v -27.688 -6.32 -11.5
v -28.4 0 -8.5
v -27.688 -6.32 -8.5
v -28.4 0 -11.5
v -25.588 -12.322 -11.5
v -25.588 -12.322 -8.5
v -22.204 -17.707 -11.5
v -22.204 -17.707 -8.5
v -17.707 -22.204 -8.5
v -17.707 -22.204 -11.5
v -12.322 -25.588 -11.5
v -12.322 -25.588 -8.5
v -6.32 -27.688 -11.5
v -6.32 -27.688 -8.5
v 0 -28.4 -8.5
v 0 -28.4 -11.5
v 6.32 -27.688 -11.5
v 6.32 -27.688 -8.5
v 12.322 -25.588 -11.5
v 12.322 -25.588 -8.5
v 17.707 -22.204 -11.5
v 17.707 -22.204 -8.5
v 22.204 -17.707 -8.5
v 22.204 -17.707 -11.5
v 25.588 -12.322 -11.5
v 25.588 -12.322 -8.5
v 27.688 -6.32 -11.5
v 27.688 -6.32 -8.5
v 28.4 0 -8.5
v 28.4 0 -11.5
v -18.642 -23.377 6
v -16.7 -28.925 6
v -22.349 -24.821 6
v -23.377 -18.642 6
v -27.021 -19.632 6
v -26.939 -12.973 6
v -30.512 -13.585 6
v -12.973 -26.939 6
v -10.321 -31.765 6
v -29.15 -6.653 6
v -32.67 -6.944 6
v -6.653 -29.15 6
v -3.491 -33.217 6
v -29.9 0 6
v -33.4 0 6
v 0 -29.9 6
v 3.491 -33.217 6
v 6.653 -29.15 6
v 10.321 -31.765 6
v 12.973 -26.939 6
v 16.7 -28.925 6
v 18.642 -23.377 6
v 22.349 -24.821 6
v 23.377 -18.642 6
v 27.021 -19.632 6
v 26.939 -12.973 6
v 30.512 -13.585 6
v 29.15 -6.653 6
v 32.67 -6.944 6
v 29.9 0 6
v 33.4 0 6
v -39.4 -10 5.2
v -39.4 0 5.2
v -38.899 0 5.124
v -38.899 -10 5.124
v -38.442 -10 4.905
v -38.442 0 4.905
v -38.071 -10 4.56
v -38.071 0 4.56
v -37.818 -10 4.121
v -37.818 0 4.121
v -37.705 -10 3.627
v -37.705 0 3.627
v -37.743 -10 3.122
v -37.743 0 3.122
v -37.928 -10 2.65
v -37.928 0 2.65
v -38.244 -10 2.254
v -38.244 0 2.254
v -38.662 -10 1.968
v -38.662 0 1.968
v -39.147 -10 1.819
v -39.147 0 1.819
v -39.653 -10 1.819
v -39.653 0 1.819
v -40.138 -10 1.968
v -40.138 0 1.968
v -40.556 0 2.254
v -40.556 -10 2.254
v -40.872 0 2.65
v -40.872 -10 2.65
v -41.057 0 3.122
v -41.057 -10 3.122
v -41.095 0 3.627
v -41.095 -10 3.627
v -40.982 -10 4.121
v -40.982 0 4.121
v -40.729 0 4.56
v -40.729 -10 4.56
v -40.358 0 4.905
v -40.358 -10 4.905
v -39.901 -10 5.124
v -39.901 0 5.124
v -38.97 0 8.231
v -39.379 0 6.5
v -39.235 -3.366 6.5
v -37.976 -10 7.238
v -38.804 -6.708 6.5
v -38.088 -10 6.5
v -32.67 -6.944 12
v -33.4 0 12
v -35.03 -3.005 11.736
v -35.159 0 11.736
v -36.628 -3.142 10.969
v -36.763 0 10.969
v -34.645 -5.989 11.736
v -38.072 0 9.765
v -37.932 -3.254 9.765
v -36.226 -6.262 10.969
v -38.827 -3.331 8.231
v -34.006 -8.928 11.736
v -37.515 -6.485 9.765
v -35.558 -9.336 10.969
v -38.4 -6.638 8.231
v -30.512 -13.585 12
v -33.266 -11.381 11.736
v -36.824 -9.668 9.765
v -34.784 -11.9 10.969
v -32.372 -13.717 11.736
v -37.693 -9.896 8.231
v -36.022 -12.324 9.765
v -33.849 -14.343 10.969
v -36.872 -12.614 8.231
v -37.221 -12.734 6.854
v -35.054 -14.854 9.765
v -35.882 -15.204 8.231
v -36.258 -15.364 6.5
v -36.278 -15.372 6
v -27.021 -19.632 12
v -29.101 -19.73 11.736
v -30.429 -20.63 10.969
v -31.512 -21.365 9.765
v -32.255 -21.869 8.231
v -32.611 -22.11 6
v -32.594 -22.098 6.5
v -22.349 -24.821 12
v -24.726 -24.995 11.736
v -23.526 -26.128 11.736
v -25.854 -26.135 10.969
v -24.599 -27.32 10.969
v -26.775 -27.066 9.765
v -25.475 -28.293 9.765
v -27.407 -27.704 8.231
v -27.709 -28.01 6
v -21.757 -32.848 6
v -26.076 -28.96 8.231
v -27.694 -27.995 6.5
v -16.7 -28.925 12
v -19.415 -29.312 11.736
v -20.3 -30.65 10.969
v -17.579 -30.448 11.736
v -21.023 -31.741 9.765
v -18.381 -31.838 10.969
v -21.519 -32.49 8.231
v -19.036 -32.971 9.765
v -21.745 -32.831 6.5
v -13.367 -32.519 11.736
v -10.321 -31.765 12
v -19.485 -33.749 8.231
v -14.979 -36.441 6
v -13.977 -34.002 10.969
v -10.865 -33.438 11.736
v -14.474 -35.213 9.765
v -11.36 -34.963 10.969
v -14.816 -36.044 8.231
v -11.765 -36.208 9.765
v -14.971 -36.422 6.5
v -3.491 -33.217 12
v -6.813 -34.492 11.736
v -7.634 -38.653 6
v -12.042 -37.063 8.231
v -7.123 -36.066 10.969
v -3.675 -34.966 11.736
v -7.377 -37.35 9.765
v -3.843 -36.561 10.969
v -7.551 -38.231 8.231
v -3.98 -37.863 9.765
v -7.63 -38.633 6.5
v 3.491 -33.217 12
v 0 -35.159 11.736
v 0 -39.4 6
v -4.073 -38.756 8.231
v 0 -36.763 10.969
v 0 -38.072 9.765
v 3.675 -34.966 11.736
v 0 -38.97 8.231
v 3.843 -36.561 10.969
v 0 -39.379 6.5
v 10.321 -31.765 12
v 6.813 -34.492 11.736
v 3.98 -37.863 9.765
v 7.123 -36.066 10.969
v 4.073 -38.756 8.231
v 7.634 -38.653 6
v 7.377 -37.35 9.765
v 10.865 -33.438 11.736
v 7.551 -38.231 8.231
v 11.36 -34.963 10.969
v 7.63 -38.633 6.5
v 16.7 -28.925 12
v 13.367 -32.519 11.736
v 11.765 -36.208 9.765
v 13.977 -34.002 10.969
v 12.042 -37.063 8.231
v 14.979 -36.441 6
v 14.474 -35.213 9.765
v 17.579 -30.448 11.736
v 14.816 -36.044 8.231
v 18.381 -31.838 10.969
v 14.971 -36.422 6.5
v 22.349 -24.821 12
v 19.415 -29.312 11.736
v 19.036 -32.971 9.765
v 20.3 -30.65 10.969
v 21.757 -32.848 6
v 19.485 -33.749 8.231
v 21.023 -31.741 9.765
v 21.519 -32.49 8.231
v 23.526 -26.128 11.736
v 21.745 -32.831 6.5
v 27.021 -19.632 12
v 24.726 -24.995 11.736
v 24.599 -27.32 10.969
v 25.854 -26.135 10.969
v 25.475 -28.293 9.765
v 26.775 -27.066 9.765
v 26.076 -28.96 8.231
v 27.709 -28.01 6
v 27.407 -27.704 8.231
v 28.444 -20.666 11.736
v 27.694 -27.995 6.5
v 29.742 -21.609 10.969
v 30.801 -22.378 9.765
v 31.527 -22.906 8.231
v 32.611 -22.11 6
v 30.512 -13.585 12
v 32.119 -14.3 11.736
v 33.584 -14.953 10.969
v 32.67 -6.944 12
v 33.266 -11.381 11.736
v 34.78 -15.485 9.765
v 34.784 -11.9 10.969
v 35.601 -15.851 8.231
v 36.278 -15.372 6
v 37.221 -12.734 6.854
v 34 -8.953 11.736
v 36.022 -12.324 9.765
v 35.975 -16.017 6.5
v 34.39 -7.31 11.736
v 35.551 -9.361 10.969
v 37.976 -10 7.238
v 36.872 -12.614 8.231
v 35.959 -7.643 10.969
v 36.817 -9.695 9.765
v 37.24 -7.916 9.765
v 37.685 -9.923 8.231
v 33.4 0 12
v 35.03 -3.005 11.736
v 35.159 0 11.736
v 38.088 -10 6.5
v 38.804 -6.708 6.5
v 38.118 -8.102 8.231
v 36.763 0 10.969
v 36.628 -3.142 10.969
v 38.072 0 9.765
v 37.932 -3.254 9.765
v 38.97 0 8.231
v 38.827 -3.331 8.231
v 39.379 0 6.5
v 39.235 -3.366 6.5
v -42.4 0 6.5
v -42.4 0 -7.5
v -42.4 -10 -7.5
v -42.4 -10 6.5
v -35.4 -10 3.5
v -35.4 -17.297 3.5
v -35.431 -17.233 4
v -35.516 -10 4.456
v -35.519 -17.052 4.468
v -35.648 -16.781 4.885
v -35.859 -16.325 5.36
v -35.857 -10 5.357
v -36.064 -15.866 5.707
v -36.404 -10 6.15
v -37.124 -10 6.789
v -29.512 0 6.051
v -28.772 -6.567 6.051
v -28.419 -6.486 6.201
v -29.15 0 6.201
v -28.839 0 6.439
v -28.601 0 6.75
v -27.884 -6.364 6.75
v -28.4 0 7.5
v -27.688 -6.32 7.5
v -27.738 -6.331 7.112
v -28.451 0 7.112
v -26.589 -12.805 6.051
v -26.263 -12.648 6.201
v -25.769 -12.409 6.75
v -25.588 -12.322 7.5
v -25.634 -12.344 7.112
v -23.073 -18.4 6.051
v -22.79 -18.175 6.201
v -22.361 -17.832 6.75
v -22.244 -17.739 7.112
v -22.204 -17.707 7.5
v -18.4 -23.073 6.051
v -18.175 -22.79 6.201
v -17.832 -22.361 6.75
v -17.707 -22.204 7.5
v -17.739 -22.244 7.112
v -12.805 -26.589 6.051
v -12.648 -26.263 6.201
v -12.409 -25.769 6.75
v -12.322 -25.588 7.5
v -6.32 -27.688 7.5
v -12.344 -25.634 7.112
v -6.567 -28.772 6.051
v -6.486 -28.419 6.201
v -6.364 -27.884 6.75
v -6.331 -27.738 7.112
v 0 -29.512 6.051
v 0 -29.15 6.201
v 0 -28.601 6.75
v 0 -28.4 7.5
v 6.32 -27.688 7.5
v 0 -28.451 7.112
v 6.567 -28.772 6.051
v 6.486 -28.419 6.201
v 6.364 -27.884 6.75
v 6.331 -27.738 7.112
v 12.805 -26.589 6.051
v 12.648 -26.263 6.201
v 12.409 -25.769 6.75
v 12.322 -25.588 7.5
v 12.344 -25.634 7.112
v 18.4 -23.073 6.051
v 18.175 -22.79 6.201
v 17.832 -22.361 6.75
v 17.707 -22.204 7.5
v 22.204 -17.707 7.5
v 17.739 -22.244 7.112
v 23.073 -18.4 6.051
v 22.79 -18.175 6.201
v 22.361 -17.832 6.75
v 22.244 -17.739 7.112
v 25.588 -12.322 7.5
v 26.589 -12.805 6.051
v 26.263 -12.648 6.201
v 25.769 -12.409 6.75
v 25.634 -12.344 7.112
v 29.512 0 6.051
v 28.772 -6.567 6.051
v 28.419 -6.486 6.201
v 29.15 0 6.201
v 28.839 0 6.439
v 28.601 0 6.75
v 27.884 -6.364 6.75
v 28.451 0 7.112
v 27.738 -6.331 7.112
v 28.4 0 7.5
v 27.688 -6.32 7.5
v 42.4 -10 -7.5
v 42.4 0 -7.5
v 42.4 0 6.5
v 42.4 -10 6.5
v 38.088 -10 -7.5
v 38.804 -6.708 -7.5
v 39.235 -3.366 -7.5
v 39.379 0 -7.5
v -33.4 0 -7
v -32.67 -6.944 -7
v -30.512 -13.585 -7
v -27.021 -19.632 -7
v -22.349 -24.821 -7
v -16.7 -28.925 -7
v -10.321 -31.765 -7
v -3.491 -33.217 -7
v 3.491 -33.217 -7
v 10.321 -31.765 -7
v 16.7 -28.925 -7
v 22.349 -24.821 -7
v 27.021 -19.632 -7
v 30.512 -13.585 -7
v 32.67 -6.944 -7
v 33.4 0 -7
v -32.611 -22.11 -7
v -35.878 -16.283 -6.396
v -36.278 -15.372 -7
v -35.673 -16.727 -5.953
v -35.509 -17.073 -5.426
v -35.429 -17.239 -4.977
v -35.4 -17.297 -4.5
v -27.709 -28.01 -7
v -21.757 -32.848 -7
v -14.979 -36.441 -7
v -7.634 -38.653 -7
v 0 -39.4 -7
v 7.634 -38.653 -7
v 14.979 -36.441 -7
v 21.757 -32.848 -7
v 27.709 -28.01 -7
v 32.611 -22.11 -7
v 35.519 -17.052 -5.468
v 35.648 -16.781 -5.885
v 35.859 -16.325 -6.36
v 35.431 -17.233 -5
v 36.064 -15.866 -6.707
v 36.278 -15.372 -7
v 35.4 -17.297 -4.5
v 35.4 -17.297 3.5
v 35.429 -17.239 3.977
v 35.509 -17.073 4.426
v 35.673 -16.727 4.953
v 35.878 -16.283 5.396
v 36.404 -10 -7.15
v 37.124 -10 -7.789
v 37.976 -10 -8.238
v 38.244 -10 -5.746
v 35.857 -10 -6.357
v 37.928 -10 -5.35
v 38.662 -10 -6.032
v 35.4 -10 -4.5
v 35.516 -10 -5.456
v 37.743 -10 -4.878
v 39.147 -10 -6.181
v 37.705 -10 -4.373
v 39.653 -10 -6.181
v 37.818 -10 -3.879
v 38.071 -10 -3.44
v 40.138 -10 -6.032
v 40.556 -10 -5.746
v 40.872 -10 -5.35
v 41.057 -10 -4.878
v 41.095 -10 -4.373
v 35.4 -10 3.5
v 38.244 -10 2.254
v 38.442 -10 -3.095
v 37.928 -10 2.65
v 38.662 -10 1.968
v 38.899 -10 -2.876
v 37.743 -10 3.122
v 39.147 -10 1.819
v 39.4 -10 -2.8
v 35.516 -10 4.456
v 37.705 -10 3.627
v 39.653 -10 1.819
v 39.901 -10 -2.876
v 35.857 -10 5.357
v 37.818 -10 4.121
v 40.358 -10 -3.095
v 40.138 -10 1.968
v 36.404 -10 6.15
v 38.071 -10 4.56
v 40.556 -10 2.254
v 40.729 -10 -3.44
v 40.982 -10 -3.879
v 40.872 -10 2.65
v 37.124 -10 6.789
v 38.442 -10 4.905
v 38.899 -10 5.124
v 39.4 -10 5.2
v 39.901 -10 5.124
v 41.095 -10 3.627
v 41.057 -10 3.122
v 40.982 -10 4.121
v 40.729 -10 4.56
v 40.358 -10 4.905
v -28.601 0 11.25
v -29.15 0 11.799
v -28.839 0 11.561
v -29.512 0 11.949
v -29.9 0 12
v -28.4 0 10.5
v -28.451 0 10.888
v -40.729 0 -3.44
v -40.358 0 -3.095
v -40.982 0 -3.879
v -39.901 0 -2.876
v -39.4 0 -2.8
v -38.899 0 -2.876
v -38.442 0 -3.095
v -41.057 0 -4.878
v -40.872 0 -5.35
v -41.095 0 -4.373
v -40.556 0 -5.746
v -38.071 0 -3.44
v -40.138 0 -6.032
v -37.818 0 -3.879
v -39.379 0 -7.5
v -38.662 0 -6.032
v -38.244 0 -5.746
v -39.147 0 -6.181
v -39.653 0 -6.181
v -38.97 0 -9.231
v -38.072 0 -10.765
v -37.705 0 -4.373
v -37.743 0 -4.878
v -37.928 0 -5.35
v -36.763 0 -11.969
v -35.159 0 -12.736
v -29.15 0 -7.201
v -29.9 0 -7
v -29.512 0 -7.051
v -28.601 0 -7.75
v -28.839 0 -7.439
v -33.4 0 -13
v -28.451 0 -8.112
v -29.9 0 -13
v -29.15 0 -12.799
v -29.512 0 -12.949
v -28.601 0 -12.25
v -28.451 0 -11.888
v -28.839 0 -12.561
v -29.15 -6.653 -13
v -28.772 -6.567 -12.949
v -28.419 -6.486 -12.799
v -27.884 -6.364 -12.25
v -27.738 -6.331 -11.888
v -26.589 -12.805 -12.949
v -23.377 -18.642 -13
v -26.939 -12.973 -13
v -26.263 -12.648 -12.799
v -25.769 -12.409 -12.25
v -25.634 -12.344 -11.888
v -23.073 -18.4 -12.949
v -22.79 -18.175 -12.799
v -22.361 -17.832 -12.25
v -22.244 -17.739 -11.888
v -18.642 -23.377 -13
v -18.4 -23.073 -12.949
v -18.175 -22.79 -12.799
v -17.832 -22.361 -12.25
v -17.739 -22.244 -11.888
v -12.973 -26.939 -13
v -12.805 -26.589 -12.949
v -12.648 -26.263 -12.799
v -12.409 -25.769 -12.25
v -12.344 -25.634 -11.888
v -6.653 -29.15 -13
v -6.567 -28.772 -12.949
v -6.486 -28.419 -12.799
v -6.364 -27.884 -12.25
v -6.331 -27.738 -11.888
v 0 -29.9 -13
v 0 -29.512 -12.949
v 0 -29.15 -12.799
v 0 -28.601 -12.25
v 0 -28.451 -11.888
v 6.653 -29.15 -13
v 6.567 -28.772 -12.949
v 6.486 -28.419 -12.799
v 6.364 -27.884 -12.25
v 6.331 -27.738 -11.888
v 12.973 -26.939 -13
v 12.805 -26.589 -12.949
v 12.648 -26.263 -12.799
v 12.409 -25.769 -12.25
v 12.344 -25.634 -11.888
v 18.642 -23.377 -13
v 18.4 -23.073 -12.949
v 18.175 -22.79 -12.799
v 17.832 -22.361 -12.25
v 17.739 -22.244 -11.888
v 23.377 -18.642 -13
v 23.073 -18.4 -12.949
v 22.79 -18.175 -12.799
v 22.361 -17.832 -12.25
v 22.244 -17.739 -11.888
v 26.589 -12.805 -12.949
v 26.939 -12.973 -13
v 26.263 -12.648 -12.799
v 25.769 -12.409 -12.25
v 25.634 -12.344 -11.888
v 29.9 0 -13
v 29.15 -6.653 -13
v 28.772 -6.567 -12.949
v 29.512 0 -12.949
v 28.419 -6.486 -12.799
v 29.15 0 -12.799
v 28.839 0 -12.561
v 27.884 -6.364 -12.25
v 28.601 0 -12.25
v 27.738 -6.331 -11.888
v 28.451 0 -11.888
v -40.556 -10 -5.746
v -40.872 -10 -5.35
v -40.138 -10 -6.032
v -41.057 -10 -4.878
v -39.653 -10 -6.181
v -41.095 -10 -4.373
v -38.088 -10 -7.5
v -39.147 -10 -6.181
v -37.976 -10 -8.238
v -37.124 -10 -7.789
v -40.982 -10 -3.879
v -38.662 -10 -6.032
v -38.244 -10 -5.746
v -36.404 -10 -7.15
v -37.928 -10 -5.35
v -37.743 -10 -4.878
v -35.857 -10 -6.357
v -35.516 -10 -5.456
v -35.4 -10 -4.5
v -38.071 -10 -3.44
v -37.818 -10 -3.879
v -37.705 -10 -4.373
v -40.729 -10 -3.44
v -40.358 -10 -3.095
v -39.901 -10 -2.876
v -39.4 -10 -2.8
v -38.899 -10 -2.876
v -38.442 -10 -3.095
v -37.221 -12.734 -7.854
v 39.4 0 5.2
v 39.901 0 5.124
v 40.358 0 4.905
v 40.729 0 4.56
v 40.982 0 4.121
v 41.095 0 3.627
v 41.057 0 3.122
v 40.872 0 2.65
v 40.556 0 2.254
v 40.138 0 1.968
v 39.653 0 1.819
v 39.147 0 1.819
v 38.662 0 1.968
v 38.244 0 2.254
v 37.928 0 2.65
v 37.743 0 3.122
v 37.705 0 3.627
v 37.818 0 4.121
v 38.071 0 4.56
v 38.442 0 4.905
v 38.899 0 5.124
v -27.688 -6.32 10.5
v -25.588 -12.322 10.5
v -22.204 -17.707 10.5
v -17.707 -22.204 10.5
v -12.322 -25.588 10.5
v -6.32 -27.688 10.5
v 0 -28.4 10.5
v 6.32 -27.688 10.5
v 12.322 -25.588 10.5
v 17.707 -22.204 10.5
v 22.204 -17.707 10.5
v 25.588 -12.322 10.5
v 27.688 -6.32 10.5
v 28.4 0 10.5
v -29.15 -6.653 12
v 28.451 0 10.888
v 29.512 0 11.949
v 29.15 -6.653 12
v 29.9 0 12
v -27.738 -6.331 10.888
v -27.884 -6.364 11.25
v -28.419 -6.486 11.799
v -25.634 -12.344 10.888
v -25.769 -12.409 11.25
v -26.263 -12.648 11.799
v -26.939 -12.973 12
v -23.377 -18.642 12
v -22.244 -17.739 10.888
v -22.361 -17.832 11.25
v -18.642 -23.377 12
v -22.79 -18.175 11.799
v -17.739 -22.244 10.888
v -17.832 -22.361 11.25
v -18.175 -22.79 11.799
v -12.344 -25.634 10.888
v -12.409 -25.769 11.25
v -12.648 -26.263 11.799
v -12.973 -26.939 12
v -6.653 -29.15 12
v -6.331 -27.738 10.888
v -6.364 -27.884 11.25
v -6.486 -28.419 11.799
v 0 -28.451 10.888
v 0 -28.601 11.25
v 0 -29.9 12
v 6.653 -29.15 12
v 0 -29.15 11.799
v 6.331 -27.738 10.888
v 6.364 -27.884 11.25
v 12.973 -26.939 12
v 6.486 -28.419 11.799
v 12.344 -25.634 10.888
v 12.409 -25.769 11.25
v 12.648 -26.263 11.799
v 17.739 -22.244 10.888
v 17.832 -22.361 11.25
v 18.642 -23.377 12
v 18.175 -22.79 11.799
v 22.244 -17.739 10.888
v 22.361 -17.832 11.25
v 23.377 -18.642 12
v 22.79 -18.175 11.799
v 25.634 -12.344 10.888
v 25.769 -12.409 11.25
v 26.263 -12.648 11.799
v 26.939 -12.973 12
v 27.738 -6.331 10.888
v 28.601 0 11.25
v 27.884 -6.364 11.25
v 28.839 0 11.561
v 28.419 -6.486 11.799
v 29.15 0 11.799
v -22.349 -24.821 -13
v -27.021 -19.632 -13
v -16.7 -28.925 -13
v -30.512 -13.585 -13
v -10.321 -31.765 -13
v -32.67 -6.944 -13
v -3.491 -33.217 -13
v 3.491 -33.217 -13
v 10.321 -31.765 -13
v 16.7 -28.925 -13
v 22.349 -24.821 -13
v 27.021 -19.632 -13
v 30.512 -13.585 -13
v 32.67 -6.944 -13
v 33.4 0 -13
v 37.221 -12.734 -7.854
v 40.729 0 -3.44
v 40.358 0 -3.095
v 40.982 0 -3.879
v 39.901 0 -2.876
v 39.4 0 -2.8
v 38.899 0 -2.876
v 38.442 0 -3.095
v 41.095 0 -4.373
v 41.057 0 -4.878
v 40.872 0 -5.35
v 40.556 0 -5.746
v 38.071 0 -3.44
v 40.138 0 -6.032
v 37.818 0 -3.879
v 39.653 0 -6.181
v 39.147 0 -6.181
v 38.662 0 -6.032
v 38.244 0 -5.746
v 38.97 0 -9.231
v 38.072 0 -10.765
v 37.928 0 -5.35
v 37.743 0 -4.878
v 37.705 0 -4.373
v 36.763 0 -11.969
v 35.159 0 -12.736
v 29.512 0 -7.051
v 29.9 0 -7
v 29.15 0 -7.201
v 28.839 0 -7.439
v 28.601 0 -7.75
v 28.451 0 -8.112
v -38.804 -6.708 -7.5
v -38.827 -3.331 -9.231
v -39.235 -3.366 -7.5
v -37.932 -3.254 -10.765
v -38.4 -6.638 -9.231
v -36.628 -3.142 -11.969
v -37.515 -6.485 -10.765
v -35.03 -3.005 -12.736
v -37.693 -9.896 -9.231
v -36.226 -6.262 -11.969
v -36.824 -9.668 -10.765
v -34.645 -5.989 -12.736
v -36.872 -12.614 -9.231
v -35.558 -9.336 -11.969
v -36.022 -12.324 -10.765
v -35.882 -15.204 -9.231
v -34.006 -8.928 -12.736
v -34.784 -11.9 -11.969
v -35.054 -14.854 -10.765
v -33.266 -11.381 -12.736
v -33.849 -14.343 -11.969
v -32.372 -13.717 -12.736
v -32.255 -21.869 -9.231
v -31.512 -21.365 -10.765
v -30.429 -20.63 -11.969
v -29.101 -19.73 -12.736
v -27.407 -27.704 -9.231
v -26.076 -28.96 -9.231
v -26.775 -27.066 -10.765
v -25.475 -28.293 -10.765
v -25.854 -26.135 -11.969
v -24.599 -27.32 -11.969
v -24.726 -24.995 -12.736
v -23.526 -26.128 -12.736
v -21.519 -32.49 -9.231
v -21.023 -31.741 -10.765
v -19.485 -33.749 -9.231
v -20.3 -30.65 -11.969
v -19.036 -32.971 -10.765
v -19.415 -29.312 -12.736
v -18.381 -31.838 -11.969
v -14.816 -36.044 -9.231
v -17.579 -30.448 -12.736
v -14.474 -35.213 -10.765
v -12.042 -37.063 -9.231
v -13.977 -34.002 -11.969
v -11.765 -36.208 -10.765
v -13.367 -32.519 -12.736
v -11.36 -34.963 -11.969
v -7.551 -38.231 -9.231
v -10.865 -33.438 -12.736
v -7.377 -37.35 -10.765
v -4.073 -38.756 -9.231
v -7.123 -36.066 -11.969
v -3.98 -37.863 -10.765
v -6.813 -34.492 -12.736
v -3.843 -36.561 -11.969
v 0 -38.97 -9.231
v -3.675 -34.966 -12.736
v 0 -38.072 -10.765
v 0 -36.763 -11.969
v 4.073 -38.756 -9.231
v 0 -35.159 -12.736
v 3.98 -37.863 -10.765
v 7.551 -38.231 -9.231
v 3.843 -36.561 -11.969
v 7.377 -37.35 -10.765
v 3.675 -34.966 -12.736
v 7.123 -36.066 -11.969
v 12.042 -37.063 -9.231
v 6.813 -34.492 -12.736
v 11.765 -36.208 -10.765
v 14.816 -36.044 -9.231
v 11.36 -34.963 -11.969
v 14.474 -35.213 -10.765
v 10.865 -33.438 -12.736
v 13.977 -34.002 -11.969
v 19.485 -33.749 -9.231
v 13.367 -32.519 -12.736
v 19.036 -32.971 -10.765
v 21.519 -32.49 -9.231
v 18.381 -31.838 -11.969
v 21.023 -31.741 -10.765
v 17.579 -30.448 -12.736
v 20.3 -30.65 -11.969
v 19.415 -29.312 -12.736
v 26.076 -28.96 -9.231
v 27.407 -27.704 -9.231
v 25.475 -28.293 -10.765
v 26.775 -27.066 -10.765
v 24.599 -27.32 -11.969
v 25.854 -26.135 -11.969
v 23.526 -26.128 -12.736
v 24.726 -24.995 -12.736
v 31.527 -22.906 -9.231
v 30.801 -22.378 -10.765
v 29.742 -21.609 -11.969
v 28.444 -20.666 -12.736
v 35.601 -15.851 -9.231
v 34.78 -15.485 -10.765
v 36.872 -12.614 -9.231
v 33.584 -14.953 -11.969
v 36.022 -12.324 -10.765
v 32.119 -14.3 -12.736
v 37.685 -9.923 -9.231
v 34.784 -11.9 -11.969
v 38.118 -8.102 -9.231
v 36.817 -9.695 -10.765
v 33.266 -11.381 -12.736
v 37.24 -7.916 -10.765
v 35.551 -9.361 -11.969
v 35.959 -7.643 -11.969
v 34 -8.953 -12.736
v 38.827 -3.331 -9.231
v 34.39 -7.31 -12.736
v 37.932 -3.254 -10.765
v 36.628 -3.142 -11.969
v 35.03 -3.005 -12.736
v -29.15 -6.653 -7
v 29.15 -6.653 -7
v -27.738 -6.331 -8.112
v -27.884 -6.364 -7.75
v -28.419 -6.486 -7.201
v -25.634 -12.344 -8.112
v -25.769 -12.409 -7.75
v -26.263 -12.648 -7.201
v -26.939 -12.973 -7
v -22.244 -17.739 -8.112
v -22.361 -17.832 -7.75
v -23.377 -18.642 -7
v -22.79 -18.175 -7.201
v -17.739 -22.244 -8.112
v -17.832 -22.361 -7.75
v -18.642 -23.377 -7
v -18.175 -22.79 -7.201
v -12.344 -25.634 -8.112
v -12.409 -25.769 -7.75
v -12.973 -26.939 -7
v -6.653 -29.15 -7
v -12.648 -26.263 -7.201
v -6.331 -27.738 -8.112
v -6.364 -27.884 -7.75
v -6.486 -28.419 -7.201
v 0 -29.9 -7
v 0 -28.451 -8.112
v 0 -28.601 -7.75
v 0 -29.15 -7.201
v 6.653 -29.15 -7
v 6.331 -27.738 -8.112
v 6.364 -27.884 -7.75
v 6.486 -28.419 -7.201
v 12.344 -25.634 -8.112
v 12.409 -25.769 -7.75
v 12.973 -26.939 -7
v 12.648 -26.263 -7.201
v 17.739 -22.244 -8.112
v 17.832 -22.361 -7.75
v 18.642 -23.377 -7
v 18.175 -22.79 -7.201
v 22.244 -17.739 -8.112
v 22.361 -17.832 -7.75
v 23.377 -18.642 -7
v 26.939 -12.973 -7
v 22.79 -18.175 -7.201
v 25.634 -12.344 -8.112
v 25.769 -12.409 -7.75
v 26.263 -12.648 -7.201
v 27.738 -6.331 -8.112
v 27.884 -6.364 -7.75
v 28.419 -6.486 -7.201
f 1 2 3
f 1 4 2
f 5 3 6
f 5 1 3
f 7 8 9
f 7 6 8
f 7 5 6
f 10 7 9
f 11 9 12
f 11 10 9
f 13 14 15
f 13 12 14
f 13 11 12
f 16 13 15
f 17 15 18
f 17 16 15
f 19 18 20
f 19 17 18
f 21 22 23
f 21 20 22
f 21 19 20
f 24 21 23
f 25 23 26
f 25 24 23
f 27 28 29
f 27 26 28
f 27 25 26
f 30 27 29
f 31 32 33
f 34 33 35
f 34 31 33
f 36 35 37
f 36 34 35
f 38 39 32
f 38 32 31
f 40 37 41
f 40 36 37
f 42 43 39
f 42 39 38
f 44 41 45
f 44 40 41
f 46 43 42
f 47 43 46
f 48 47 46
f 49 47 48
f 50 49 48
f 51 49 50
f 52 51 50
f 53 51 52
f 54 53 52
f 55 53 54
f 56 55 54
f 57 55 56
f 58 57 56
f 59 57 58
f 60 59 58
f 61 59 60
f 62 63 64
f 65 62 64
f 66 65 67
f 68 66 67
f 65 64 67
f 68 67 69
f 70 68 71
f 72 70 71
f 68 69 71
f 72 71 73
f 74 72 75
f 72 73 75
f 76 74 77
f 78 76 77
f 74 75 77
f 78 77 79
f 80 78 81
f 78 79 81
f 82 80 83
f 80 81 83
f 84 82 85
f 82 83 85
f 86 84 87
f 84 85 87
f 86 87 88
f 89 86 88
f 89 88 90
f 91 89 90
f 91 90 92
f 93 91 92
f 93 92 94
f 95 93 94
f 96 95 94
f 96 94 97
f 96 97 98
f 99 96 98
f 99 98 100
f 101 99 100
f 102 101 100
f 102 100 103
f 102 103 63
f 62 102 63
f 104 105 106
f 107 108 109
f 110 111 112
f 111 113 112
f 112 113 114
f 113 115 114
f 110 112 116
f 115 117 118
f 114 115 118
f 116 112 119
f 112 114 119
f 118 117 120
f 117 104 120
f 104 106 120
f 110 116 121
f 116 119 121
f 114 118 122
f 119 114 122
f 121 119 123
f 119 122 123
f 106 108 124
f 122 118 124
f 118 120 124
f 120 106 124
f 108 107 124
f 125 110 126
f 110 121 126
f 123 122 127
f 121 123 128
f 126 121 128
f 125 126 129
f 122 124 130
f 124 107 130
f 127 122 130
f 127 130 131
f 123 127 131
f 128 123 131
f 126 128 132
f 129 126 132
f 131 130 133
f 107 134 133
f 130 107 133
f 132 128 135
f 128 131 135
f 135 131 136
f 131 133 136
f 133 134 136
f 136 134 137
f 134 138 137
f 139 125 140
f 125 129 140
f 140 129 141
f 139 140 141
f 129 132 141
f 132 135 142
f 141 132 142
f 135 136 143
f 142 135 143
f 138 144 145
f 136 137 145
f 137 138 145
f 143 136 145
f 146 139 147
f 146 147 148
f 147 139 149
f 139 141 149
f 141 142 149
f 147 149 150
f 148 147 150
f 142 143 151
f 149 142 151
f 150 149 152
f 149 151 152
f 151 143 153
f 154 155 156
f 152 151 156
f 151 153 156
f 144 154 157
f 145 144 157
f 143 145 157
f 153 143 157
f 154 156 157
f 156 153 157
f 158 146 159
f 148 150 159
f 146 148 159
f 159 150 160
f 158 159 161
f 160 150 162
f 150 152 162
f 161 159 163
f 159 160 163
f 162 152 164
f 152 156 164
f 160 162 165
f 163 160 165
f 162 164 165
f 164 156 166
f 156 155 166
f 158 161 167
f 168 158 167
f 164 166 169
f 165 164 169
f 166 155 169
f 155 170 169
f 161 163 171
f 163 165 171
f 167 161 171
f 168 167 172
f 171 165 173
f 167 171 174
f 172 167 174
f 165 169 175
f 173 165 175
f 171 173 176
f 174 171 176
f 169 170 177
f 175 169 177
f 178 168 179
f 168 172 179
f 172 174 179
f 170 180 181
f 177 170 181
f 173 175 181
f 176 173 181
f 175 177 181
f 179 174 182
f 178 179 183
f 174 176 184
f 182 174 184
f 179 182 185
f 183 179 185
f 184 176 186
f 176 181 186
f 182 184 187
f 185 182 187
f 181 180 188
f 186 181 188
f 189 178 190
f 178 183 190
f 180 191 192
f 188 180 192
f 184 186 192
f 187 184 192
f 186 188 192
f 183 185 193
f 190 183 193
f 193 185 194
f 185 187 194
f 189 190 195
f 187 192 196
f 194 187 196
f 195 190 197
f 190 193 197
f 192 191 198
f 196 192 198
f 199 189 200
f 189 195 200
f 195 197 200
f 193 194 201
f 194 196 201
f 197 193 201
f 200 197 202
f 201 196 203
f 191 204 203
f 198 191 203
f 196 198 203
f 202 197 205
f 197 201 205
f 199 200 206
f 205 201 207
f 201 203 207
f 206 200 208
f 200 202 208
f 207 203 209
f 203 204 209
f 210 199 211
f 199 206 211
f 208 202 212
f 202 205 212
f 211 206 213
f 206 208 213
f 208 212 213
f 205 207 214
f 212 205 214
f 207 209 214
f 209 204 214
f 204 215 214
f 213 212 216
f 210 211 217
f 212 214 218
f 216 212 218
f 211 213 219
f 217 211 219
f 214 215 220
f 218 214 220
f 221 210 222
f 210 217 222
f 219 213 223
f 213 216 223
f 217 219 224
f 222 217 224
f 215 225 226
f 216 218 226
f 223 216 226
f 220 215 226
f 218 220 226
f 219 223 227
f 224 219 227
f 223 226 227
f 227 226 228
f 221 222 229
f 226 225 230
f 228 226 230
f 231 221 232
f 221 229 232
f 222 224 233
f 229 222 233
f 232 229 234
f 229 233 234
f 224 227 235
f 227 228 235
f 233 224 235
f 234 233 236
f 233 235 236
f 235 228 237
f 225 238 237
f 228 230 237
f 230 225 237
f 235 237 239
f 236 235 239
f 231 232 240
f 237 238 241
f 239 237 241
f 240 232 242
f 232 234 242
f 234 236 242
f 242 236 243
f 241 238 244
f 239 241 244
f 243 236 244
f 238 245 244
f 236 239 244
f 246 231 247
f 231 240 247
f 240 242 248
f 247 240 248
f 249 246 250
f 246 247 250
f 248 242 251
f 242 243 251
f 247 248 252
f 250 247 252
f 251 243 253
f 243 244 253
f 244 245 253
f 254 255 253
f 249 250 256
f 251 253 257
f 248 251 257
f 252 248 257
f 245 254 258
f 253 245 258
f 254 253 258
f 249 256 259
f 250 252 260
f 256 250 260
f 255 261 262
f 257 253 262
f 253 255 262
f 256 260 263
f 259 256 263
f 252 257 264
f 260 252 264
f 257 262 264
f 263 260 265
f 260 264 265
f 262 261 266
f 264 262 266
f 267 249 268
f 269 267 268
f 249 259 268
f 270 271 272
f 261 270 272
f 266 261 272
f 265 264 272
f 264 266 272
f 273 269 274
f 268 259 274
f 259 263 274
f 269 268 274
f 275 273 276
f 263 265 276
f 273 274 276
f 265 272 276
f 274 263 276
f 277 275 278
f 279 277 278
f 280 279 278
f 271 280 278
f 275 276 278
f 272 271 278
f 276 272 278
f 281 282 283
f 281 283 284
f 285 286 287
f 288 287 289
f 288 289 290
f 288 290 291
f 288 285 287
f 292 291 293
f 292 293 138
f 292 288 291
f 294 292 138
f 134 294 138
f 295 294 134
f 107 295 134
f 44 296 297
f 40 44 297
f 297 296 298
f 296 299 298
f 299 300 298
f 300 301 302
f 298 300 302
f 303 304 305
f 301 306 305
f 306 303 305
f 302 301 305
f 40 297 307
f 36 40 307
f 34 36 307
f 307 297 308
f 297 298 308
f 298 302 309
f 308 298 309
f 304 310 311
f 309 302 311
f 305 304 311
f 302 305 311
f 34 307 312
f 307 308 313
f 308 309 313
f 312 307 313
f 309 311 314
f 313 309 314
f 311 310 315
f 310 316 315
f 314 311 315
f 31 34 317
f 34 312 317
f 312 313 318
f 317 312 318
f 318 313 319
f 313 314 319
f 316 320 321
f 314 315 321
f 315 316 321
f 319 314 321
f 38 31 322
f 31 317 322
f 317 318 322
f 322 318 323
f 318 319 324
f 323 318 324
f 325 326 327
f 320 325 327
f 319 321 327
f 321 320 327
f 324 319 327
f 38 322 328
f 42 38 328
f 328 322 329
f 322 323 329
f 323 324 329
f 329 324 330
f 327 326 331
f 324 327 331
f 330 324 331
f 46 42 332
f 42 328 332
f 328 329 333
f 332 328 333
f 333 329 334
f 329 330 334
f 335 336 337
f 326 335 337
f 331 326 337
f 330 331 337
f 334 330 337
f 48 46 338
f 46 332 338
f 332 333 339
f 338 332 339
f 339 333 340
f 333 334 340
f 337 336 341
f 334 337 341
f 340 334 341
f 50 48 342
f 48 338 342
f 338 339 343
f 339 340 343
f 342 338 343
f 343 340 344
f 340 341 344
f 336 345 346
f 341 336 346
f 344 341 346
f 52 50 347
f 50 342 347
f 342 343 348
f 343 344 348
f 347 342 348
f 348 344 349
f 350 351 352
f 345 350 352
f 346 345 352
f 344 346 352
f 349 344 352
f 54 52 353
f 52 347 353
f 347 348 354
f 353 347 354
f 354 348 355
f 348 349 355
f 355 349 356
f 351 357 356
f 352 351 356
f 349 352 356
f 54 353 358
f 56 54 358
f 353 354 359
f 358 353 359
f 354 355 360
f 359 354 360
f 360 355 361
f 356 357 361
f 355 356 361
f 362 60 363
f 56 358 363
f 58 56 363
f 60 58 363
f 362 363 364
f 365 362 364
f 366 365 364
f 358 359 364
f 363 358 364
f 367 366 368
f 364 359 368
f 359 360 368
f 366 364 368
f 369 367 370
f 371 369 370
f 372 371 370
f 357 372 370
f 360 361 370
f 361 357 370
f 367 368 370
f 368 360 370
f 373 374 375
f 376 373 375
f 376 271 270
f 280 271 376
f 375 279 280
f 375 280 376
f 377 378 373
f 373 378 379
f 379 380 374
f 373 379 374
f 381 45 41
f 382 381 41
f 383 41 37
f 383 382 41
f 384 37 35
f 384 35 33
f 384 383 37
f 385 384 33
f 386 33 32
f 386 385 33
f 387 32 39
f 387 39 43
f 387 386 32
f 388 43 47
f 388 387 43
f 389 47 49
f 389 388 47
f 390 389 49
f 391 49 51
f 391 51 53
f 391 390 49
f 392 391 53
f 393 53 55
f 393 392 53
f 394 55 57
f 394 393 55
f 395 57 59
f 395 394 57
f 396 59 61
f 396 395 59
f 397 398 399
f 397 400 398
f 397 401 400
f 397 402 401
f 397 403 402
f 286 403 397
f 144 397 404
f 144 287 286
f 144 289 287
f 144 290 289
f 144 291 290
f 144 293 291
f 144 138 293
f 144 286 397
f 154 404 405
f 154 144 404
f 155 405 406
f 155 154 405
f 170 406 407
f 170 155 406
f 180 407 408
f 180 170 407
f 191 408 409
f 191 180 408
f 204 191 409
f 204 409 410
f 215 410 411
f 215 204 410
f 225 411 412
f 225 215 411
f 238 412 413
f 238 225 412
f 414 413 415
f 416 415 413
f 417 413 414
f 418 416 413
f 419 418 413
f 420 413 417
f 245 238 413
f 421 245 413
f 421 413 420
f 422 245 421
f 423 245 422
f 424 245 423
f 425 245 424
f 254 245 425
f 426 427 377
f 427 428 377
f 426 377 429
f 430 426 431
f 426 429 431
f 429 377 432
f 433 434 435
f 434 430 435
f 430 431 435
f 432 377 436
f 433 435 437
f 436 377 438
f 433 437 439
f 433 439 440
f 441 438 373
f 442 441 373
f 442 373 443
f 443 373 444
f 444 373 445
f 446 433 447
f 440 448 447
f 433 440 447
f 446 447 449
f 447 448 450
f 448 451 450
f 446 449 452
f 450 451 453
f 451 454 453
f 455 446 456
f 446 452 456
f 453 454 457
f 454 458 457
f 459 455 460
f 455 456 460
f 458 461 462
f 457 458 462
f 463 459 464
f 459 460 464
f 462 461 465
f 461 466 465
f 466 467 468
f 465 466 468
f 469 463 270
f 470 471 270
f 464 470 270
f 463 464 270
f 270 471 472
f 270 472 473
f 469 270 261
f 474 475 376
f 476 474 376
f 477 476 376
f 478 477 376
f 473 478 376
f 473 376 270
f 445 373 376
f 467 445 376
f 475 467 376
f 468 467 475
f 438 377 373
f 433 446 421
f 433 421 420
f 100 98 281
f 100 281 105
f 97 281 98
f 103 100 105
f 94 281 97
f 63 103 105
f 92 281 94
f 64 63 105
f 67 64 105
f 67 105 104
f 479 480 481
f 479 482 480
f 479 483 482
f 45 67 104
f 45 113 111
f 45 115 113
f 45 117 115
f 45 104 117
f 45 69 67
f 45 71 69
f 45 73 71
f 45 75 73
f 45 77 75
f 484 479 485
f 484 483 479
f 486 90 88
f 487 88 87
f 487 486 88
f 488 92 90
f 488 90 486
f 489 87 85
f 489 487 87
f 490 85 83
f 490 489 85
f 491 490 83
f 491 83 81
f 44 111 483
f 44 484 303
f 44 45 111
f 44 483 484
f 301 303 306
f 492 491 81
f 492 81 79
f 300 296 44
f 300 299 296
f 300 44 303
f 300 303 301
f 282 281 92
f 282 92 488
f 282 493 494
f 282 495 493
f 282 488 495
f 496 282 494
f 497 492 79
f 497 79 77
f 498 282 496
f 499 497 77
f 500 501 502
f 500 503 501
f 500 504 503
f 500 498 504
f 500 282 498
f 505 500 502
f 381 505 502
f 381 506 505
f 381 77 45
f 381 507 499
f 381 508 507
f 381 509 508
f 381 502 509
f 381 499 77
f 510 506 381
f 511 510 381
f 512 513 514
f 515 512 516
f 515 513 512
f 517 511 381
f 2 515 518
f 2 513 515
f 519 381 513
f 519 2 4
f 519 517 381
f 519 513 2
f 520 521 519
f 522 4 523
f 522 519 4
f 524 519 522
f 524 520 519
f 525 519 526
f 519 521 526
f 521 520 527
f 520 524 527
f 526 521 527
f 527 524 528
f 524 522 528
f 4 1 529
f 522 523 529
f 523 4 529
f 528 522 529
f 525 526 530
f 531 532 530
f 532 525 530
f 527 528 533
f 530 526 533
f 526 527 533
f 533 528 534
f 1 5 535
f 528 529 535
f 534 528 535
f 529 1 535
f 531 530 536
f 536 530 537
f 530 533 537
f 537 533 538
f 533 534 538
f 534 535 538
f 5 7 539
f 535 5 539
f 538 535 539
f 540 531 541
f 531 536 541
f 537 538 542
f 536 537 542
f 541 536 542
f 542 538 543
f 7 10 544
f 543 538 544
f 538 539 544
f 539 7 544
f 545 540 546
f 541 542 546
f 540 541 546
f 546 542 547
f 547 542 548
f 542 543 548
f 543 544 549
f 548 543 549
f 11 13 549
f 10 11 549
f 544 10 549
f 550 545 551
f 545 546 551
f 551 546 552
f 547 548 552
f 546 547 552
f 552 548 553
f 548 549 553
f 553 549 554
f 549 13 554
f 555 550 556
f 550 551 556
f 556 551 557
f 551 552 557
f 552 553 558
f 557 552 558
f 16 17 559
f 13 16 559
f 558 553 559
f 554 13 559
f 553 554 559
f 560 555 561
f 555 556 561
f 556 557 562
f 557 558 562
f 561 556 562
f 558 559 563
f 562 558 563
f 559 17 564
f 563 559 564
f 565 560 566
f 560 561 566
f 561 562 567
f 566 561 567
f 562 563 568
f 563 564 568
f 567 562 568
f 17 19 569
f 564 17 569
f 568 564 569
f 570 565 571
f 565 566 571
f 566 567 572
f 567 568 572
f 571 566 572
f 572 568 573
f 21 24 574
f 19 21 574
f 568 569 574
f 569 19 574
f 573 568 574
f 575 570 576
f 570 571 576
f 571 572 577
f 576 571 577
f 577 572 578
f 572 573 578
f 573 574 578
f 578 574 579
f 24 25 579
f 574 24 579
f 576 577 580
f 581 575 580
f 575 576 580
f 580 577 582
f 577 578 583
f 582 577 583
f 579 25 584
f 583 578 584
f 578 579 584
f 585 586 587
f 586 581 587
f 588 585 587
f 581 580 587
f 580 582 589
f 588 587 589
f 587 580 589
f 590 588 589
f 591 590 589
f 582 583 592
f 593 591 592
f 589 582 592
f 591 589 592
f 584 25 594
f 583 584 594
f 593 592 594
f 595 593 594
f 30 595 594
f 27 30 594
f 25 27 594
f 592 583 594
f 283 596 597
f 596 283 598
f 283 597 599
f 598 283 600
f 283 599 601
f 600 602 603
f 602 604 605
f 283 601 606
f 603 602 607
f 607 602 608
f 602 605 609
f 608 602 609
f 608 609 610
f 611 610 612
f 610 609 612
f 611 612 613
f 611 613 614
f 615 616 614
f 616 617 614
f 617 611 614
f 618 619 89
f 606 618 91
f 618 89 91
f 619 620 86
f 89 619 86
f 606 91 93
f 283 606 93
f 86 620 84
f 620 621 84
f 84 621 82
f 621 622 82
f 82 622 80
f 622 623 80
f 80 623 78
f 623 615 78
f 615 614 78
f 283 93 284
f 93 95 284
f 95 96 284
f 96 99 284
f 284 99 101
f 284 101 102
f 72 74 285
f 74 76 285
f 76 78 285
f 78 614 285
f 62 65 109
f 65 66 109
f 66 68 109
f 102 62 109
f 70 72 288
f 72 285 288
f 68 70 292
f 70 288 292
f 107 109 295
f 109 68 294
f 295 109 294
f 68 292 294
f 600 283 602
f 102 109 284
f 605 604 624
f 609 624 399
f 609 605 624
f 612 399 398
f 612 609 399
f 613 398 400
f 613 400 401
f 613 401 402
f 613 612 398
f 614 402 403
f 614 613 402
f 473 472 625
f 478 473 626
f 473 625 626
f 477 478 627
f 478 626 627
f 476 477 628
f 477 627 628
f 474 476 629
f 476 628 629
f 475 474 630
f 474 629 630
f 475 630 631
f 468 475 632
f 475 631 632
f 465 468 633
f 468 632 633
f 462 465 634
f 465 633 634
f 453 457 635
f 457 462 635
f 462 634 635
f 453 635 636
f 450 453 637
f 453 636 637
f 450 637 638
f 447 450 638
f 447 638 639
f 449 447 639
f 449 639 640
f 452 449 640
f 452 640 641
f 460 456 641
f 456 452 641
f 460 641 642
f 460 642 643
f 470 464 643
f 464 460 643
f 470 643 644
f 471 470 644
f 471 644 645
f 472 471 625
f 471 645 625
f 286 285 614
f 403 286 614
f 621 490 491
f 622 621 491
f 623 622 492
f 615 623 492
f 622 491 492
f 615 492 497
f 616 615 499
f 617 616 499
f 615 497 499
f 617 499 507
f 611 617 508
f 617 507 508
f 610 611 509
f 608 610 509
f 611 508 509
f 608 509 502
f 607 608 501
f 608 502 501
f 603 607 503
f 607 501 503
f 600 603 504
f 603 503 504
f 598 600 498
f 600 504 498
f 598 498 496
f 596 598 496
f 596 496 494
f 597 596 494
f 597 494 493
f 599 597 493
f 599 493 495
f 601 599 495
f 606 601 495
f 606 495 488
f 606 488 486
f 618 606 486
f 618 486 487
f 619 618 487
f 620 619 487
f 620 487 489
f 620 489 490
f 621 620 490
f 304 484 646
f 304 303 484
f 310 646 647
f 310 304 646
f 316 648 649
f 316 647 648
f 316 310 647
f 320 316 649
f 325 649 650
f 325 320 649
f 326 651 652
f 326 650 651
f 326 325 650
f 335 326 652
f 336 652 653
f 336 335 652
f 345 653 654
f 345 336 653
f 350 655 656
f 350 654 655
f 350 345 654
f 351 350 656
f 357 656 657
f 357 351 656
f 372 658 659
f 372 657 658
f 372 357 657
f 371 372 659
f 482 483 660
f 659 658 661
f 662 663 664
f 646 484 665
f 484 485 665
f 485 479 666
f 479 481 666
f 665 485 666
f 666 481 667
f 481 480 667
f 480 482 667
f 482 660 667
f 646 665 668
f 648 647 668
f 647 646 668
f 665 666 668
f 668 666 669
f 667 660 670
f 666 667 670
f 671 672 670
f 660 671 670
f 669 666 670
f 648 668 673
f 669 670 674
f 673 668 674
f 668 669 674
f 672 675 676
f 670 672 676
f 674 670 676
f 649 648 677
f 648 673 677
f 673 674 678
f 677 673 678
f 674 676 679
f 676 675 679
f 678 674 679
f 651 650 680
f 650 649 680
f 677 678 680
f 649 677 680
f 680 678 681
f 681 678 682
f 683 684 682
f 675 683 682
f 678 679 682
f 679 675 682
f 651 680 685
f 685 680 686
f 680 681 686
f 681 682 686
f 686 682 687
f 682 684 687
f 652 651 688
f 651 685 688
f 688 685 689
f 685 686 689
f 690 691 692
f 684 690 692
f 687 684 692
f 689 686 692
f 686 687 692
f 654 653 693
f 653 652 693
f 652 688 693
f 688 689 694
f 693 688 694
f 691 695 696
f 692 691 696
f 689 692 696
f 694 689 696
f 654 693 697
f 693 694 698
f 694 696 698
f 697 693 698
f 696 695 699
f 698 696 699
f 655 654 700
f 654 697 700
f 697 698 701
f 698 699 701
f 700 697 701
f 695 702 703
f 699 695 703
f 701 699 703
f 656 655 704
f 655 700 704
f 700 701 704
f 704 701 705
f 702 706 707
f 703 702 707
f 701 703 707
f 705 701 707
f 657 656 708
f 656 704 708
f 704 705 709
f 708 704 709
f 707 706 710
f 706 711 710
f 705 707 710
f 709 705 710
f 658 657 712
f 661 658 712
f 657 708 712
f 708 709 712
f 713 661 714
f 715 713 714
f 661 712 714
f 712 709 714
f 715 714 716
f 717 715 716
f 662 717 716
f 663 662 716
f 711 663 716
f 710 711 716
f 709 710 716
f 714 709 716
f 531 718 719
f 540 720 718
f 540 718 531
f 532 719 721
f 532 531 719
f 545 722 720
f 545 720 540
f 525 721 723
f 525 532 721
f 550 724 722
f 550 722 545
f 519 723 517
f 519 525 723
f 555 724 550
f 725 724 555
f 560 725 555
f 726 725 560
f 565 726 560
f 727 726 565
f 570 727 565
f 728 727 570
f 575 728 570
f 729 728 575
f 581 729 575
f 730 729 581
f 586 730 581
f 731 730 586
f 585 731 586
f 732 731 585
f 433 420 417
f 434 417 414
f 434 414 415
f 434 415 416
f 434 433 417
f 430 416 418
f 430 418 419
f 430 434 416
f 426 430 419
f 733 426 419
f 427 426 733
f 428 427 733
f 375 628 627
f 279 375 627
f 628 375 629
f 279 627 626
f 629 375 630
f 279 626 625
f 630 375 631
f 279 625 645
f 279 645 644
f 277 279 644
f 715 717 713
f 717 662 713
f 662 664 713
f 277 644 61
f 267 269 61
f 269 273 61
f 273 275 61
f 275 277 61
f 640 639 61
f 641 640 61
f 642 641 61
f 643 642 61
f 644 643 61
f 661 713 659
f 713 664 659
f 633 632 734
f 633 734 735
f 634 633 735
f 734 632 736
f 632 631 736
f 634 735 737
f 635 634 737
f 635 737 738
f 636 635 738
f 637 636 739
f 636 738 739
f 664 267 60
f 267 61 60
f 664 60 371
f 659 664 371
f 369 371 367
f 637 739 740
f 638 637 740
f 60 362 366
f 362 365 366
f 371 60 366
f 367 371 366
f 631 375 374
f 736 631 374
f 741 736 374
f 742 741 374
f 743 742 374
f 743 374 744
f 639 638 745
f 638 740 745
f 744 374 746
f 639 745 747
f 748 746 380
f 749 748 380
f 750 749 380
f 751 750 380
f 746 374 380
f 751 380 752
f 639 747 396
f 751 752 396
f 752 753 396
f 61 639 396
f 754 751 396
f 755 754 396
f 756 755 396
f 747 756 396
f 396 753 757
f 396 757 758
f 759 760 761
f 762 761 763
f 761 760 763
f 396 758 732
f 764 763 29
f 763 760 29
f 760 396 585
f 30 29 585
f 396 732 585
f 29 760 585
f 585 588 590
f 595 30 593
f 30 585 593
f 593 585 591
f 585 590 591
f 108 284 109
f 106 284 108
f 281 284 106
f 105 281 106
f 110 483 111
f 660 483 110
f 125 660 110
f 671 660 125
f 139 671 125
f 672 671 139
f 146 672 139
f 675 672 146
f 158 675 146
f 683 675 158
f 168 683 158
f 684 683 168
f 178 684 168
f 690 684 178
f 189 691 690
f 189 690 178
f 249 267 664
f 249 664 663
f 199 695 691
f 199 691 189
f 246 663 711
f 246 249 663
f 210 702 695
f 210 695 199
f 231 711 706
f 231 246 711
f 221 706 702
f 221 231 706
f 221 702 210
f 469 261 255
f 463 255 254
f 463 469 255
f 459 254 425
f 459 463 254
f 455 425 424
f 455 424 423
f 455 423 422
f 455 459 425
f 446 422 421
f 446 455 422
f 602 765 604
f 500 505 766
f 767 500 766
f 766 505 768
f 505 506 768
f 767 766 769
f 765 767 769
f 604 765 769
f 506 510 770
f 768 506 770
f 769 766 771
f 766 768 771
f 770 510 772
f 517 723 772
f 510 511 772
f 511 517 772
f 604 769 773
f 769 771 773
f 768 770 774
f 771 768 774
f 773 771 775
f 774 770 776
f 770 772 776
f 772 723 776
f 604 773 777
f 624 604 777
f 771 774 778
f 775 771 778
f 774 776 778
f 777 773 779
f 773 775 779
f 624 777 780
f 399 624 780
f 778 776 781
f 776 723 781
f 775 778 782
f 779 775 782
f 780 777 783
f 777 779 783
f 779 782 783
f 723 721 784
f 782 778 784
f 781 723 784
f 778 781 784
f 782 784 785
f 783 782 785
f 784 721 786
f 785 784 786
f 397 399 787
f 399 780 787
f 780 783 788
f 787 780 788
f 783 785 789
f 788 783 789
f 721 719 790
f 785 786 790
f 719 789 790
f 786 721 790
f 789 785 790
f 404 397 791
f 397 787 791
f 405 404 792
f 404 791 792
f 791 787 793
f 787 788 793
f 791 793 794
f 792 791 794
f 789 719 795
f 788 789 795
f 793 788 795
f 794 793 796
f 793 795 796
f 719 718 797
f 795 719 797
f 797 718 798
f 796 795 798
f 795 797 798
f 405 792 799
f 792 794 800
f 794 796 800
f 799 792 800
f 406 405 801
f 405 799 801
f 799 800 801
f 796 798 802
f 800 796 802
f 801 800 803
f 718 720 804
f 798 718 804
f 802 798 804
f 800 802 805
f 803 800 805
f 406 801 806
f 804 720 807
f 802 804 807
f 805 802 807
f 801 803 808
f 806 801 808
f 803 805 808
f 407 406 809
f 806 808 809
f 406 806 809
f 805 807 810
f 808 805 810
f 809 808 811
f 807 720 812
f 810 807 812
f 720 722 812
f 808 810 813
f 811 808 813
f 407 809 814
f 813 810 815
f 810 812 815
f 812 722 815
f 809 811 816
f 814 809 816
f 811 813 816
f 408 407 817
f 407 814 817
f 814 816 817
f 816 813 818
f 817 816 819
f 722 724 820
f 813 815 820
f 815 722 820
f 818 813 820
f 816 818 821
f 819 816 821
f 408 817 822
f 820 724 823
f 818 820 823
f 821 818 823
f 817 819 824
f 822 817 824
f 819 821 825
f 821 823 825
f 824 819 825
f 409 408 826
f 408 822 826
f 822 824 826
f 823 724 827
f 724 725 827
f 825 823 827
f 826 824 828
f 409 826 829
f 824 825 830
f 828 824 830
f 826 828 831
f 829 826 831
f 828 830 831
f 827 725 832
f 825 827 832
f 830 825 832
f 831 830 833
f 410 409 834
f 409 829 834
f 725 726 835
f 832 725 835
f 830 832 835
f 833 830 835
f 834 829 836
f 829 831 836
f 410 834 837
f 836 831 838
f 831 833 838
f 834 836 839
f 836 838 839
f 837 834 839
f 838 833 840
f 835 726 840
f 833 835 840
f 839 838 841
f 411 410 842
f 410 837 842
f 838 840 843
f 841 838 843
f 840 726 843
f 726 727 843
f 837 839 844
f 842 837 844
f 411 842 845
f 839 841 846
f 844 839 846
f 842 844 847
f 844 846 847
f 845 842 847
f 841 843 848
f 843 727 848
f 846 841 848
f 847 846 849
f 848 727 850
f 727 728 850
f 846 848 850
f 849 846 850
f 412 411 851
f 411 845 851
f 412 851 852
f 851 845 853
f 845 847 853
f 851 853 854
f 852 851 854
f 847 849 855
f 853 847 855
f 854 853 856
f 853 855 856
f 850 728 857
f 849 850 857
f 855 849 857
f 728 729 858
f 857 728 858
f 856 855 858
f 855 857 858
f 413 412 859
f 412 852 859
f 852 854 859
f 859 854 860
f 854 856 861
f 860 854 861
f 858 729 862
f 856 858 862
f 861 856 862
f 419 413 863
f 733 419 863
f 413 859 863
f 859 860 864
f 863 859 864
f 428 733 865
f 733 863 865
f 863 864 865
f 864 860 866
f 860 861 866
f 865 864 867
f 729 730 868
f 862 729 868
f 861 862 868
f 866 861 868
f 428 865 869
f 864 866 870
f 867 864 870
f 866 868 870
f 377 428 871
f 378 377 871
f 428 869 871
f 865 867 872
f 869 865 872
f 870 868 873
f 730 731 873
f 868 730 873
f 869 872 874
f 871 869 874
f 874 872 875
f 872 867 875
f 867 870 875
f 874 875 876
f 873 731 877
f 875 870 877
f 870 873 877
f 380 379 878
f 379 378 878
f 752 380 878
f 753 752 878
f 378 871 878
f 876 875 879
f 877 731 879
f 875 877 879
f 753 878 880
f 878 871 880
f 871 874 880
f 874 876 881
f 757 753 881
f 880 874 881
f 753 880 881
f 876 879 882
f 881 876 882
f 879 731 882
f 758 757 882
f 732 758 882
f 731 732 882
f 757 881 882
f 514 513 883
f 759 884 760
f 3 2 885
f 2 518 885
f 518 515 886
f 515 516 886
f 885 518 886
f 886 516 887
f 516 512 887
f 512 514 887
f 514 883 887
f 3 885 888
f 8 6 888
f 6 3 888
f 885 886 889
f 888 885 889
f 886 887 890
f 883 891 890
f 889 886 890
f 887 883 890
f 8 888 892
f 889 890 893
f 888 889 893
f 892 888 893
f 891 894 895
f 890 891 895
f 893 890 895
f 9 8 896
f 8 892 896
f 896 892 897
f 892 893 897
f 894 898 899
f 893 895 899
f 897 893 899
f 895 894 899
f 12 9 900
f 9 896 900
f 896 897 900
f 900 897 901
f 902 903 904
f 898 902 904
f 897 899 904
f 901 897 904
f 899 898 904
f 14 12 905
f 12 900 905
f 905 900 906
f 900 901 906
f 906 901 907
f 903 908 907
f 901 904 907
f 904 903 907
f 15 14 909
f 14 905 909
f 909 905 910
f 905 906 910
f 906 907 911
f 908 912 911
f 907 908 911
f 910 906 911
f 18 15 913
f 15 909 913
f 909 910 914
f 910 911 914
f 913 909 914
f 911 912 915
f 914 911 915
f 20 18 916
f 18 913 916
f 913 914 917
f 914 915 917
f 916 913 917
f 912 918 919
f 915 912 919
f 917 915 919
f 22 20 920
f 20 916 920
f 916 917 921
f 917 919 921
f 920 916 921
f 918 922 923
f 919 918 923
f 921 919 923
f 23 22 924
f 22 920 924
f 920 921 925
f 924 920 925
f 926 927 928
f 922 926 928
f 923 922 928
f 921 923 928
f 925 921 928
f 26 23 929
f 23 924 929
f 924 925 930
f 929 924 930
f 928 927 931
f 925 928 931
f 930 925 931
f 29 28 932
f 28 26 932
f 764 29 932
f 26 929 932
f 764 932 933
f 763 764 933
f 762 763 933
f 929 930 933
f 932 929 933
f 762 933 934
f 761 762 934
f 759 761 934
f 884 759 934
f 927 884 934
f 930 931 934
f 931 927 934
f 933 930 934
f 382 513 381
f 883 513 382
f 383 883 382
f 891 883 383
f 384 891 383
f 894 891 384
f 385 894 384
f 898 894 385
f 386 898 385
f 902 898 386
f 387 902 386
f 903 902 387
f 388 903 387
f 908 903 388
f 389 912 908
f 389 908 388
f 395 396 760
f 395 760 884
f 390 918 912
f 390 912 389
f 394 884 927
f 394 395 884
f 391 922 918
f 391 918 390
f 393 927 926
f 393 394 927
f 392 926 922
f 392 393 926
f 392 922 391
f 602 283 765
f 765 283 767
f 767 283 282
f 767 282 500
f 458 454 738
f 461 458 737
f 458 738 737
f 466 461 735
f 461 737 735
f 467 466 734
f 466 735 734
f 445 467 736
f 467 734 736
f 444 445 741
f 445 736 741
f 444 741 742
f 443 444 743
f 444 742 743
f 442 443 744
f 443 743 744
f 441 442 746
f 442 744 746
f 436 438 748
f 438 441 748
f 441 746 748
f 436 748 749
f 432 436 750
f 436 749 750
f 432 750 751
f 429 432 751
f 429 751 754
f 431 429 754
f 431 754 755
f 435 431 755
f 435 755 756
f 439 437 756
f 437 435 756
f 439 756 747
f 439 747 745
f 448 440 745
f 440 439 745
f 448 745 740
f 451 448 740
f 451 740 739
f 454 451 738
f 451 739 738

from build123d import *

# Parameters (mm, degrees)
REVOLUTION004_ANGLE     = 180
SKETCH055_W             = 14
SKETCH055_H             = 6
PAD024_DEPTH            = 10
SKETCH054_R             = 1.7
POCKET003_DEPTH         = 39.401
POCKET004_DEPTH         = 29.401
BODY012_PLACEMENT_ANGLE = 180


with BuildPart() as part:
    # Sketch053 → Revolution004 (revolve, symmetric)
    with BuildSketch(Plane.YZ) as revolution004_sk:
        with BuildLine():
            Line((33.4, 0), (33.4, 6.5))
            Line((33.4, 6.5), (29.9, 6.5))
            ThreePointArc((28.4, 8), (28.83934, 6.93934), (29.9, 6.5))
            Line((28.4, 8), (28.4, 11))
            ThreePointArc((29.9, 12.5), (28.83934, 12.06066), (28.4, 11))
            Line((29.9, 12.5), (33.4, 12.5))
            ThreePointArc((39.4, 6.5), (37.642641, 10.742641), (33.4, 12.5))
            Line((39.4, 6.5), (39.4, 0))
            Line((39.4, 0), (39.4, -6.5))
            ThreePointArc((33.4, -12.5), (37.642641, -10.742641), (39.4, -6.5))
            Line((33.4, -12.5), (29.9, -12.5))
            ThreePointArc((28.4, -11), (28.83934, -12.06066), (29.9, -12.5))
            Line((28.4, -11), (28.4, -8))
            ThreePointArc((29.9, -6.5), (28.83934, -6.93934), (28.4, -8))
            Line((29.9, -6.5), (33.4, -6.5))
            Line((33.4, -6.5), (33.4, 0))
        make_face()
    revolve(axis=Axis((0, 0, 0), (0, 0, 1)), revolution_arc=REVOLUTION004_ANGLE / 2)
    revolve(revolution004_sk.sketch, axis=Axis((0, 0, 0), (0, 0, -1)), revolution_arc=REVOLUTION004_ANGLE / 2)

    # Sketch055 (on Face18 of Revolution004) → Pad024 (new body)
    with BuildSketch(Plane(origin=(0, 0, 0), x_dir=(0, 0, -1), z_dir=(0, -1, 0))):
        with Locations((0, 39.4)):
            Rectangle(SKETCH055_W, SKETCH055_H)
        with Locations((0, -39.4)):
            Rectangle(SKETCH055_W, SKETCH055_H)
    extrude(amount=-PAD024_DEPTH)

    # Sketch054 (on Face18 of Revolution004) → Pocket003 (cut, through all)
    with BuildSketch(Plane(origin=(0, 0, 0), x_dir=(0, 0, -1), z_dir=(0, -1, 0))):
        with Locations((4, 39.4)):
            Circle(SKETCH054_R)
        with Locations((-4, 39.4)):
            Circle(SKETCH054_R)
        with Locations((-4, -39.4)):
            Circle(SKETCH054_R)
        with Locations((4, -39.4)):
            Circle(SKETCH054_R)
    extrude(amount=-POCKET003_DEPTH, mode=Mode.SUBTRACT)

    # Sketch056 (on Face22 of Pocket003) → Pocket004 (cut, through all)
    with BuildSketch(Plane.ZX.offset(10)):
        with BuildLine():
            Line((-4, 43.4), (4.000001, 43.4))
            ThreePointArc((4.000001, 35.4), (8, 39.4), (4.000001, 43.4))
            Line((-4, 35.4), (4.000001, 35.4))
            ThreePointArc((-4, 43.4), (-8, 39.4), (-4, 35.4))
        make_face()
        with BuildLine():
            Line((-4, -35.4), (4, -35.4))
            ThreePointArc((4, -43.4), (8, -39.4), (4, -35.4))
            Line((-4, -43.4), (4, -43.4))
            ThreePointArc((-4, -35.4), (-8, -39.4), (-4, -43.4))
        make_face()
    extrude(amount=POCKET004_DEPTH, mode=Mode.SUBTRACT)


with BuildPart() as part_1:
    # Body012 placement: moved
    add(part.part.moved(Location((0, 0, -0.5))).rotate(Axis((0, 0, -0.5), (1, 0, 0)), BODY012_PLACEMENT_ANGLE))


solid = part_1.part
